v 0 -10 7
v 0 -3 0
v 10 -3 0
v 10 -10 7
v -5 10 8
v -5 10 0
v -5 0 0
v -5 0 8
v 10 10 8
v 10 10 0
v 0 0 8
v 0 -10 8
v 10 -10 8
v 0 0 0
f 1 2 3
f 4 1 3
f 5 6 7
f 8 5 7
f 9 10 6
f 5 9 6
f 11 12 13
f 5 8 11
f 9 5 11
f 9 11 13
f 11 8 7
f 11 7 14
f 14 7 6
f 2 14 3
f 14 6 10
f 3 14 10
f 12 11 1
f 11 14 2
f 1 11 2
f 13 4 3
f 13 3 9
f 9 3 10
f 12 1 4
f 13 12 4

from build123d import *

# Parameters (mm, degrees)
F1_DEPTH = 8
F2_SIZE  = 7


with BuildPart() as f1:
    # F0 (on Top) → F1 (new body)
    with BuildSketch(Plane.XY):
        Polygon((10, -10), (10, 10), (-5, 10), (-5, 0), (0, 0), (0, -10), align=None)
    extrude(amount=F1_DEPTH)

    # F2
    f2_edges = [f1.edges().sort_by_distance(p)[0] for p in [
        (5, -10, 0),
    ]]
    chamfer(f2_edges, length=F2_SIZE)


solid = f1.part
